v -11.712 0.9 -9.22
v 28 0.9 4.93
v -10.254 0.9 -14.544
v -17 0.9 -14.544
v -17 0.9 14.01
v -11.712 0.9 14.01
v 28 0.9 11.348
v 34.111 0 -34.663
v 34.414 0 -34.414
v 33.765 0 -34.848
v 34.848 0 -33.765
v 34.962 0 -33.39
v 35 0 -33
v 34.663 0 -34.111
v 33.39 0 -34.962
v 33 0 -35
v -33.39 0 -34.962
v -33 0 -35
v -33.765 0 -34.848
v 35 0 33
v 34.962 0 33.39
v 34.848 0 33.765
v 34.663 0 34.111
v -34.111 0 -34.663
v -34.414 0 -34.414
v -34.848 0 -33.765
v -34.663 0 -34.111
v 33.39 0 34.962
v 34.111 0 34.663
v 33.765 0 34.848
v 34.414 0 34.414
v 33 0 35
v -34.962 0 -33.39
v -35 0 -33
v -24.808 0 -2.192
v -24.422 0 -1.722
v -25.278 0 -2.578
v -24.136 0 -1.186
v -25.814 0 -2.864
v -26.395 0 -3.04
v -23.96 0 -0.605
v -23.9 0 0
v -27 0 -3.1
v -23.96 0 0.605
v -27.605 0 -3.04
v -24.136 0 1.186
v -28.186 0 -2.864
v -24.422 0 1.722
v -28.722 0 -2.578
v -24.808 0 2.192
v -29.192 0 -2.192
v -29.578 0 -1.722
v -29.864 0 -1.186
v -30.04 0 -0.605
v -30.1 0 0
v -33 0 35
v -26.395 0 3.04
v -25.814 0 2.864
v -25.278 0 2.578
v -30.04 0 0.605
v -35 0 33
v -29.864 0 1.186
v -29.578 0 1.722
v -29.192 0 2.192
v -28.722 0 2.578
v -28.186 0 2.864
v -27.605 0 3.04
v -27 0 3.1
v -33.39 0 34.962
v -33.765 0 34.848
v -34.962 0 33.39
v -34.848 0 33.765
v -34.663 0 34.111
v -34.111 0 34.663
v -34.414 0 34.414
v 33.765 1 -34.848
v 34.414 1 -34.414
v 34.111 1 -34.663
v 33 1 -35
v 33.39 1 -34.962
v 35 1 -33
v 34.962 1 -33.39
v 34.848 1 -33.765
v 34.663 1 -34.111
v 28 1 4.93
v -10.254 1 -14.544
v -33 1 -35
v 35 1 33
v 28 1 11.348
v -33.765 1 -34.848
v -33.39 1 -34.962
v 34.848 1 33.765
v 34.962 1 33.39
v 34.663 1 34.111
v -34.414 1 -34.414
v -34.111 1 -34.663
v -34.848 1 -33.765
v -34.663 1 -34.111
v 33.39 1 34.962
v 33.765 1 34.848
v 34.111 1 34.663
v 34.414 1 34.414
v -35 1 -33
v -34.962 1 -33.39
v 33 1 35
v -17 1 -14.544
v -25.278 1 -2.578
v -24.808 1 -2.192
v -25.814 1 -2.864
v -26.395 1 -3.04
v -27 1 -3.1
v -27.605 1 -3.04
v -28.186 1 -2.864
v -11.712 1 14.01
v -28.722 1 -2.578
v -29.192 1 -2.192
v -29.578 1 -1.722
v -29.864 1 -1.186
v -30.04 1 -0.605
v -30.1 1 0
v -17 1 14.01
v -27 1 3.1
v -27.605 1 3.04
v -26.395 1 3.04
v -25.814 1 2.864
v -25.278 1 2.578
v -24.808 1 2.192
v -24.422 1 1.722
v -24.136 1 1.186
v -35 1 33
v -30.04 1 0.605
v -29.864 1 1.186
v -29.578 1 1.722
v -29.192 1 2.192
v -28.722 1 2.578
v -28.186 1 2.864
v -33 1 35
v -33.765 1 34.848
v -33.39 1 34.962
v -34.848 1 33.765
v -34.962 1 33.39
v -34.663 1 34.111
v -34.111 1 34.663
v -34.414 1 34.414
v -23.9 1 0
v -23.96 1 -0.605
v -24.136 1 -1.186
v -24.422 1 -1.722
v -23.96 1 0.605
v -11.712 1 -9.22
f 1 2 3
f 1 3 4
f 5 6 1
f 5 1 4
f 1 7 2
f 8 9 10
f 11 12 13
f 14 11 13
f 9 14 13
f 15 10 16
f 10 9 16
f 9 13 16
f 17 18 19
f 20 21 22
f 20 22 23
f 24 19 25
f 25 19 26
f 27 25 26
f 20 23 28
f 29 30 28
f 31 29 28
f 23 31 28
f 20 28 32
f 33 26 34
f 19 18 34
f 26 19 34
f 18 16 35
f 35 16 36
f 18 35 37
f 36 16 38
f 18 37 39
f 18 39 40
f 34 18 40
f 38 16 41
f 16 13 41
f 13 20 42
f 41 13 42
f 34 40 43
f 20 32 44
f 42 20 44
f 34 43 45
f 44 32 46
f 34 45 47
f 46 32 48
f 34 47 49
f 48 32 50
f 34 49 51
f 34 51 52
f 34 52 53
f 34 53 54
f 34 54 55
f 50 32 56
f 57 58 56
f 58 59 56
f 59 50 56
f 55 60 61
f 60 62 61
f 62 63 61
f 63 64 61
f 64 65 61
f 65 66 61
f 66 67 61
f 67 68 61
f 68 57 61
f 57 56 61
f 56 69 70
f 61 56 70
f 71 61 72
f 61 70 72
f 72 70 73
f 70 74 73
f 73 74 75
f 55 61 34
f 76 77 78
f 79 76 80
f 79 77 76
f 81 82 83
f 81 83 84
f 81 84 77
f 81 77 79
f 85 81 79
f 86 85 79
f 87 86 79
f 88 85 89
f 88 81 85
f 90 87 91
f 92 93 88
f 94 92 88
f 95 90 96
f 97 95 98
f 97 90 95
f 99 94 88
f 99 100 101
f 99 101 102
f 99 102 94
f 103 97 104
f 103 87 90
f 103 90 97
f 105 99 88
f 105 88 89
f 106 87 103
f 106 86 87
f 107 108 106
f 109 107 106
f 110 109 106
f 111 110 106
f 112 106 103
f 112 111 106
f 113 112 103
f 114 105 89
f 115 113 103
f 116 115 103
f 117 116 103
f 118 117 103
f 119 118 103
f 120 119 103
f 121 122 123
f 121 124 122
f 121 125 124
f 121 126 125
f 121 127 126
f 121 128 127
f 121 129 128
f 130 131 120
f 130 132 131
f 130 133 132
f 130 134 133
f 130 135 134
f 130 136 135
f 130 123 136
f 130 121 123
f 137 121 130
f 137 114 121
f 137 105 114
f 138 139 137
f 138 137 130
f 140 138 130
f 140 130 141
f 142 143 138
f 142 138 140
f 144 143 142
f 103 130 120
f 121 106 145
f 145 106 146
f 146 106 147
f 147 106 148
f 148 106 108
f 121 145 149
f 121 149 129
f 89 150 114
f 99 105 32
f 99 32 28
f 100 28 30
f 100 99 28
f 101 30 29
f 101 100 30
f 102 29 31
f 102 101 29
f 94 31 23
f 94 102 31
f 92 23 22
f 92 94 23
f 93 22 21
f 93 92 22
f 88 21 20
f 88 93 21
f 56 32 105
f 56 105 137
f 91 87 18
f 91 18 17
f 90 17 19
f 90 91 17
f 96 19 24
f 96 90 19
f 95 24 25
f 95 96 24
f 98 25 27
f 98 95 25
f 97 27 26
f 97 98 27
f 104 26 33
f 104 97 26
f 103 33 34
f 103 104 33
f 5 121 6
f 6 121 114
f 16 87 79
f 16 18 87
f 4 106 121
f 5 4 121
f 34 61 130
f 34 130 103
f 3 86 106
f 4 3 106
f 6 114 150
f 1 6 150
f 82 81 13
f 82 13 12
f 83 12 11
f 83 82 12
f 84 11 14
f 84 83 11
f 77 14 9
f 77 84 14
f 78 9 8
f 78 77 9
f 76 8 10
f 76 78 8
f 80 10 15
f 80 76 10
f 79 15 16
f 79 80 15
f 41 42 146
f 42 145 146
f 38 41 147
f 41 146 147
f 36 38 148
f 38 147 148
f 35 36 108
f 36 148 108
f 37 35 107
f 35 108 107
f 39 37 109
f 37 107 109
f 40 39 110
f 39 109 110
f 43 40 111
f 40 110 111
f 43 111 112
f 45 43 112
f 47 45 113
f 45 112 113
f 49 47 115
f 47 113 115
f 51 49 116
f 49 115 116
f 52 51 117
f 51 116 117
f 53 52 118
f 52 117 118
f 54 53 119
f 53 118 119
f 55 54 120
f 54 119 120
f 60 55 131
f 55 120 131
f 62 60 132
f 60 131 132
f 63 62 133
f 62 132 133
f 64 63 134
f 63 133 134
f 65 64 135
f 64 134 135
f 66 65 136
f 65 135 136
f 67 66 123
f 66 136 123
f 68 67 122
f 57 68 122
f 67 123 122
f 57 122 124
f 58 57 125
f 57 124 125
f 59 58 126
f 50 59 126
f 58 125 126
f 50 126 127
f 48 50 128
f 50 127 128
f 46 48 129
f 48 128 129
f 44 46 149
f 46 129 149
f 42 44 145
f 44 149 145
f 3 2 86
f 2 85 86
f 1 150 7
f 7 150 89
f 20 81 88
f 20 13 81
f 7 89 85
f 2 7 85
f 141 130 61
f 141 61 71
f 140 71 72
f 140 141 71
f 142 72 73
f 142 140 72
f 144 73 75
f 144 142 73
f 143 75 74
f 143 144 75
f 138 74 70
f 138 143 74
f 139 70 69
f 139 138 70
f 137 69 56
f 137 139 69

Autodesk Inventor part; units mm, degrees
ref_plane "YZ Plane" through (0, 0, 0) normal (1, 0, 0) x (0, 1, 0)
ref_plane "XZ Plane" through (0, 0, 0) normal (0, 1, 0) x (-1, 0, 0)
ref_plane "XY Plane" through (0, 0, 0) normal (0, 0, 1) x (1, 0, 0)
sketch "Sketch1" plane through (0, 0, 0) normal (0, 1, 0) x (-1, 0, 0)
  line L0 (-35, 35) -> (35, 35)
  line L1 (35, 35) -> (35, -35)
  line L2 (35, -35) -> (-35, -35)
  line L3 (-35, -35) -> (-35, 35)
  line L4 (-35, 35) -> (35, -35) construction
  line L5 (35, 35) -> (-35, -35) construction
  point P0 (0, 0)
  dimension "d0" = 70
  dimension "d1" = 70
extrude "Extrusion1" add sketch "Sketch1" along normal blind 1
sketch "Sketch2" plane through (0, 1, 0) normal (0, 1, 0) x (1, 0, 0)
  line L0 (-17, -17) -> (-17, 35) construction
  line L1 (25, -35) -> (25, 35) construction
  line L2 (35, -35) -> (35, 35) projected
  line L3 (-35, 35) -> (-35, -35) projected
  line L4 (-10.2536, 14.5438) -> (28, -4.9295)
  line L5 (28, -4.9295) -> (28, -11.3476)
  line L6 (28, -11.3476) -> (-11.7123, 9.2196)
  line L7 (-11.7123, 9.2196) -> (-11.7123, -14.0097)
  line L8 (-11.7123, -14.0097) -> (-17, -14.0097)
  line L9 (-17, -14.0097) -> (-17, 14.5438)
  line L10 (-17, 14.5438) -> (-10.2536, 14.5438)
  point P0 (0, 0)
  dimension "d4" = 10
  dimension "d5" = 18
sketch "Sketch5" plane through (0, 1, 0) normal (0, 1, 0) x (1, 0, 0)
  circle A0 centre (-27, 0) radius 3.1
  line L0 (-35, 35) -> (-35, -35) projected
  line L1 (-35, 0) -> (0, 0) construction
  dimension "d14" = 6.2
  dimension "d15" = 8
extrude "Extrusion4" cut sketch "Sketch5" against normal up to next
fillet "Fillet1" radius 2 4 edges at (-35, 0.5, -35) (-35, 0.5, 35) (35, 0.5, -35) (35, 0.5, 35)
emboss "Emboss2" sketch "Sketch2" operation cut depth 0.1 direction (0, -1, 0)
properties part number "AntennaNameplate"
